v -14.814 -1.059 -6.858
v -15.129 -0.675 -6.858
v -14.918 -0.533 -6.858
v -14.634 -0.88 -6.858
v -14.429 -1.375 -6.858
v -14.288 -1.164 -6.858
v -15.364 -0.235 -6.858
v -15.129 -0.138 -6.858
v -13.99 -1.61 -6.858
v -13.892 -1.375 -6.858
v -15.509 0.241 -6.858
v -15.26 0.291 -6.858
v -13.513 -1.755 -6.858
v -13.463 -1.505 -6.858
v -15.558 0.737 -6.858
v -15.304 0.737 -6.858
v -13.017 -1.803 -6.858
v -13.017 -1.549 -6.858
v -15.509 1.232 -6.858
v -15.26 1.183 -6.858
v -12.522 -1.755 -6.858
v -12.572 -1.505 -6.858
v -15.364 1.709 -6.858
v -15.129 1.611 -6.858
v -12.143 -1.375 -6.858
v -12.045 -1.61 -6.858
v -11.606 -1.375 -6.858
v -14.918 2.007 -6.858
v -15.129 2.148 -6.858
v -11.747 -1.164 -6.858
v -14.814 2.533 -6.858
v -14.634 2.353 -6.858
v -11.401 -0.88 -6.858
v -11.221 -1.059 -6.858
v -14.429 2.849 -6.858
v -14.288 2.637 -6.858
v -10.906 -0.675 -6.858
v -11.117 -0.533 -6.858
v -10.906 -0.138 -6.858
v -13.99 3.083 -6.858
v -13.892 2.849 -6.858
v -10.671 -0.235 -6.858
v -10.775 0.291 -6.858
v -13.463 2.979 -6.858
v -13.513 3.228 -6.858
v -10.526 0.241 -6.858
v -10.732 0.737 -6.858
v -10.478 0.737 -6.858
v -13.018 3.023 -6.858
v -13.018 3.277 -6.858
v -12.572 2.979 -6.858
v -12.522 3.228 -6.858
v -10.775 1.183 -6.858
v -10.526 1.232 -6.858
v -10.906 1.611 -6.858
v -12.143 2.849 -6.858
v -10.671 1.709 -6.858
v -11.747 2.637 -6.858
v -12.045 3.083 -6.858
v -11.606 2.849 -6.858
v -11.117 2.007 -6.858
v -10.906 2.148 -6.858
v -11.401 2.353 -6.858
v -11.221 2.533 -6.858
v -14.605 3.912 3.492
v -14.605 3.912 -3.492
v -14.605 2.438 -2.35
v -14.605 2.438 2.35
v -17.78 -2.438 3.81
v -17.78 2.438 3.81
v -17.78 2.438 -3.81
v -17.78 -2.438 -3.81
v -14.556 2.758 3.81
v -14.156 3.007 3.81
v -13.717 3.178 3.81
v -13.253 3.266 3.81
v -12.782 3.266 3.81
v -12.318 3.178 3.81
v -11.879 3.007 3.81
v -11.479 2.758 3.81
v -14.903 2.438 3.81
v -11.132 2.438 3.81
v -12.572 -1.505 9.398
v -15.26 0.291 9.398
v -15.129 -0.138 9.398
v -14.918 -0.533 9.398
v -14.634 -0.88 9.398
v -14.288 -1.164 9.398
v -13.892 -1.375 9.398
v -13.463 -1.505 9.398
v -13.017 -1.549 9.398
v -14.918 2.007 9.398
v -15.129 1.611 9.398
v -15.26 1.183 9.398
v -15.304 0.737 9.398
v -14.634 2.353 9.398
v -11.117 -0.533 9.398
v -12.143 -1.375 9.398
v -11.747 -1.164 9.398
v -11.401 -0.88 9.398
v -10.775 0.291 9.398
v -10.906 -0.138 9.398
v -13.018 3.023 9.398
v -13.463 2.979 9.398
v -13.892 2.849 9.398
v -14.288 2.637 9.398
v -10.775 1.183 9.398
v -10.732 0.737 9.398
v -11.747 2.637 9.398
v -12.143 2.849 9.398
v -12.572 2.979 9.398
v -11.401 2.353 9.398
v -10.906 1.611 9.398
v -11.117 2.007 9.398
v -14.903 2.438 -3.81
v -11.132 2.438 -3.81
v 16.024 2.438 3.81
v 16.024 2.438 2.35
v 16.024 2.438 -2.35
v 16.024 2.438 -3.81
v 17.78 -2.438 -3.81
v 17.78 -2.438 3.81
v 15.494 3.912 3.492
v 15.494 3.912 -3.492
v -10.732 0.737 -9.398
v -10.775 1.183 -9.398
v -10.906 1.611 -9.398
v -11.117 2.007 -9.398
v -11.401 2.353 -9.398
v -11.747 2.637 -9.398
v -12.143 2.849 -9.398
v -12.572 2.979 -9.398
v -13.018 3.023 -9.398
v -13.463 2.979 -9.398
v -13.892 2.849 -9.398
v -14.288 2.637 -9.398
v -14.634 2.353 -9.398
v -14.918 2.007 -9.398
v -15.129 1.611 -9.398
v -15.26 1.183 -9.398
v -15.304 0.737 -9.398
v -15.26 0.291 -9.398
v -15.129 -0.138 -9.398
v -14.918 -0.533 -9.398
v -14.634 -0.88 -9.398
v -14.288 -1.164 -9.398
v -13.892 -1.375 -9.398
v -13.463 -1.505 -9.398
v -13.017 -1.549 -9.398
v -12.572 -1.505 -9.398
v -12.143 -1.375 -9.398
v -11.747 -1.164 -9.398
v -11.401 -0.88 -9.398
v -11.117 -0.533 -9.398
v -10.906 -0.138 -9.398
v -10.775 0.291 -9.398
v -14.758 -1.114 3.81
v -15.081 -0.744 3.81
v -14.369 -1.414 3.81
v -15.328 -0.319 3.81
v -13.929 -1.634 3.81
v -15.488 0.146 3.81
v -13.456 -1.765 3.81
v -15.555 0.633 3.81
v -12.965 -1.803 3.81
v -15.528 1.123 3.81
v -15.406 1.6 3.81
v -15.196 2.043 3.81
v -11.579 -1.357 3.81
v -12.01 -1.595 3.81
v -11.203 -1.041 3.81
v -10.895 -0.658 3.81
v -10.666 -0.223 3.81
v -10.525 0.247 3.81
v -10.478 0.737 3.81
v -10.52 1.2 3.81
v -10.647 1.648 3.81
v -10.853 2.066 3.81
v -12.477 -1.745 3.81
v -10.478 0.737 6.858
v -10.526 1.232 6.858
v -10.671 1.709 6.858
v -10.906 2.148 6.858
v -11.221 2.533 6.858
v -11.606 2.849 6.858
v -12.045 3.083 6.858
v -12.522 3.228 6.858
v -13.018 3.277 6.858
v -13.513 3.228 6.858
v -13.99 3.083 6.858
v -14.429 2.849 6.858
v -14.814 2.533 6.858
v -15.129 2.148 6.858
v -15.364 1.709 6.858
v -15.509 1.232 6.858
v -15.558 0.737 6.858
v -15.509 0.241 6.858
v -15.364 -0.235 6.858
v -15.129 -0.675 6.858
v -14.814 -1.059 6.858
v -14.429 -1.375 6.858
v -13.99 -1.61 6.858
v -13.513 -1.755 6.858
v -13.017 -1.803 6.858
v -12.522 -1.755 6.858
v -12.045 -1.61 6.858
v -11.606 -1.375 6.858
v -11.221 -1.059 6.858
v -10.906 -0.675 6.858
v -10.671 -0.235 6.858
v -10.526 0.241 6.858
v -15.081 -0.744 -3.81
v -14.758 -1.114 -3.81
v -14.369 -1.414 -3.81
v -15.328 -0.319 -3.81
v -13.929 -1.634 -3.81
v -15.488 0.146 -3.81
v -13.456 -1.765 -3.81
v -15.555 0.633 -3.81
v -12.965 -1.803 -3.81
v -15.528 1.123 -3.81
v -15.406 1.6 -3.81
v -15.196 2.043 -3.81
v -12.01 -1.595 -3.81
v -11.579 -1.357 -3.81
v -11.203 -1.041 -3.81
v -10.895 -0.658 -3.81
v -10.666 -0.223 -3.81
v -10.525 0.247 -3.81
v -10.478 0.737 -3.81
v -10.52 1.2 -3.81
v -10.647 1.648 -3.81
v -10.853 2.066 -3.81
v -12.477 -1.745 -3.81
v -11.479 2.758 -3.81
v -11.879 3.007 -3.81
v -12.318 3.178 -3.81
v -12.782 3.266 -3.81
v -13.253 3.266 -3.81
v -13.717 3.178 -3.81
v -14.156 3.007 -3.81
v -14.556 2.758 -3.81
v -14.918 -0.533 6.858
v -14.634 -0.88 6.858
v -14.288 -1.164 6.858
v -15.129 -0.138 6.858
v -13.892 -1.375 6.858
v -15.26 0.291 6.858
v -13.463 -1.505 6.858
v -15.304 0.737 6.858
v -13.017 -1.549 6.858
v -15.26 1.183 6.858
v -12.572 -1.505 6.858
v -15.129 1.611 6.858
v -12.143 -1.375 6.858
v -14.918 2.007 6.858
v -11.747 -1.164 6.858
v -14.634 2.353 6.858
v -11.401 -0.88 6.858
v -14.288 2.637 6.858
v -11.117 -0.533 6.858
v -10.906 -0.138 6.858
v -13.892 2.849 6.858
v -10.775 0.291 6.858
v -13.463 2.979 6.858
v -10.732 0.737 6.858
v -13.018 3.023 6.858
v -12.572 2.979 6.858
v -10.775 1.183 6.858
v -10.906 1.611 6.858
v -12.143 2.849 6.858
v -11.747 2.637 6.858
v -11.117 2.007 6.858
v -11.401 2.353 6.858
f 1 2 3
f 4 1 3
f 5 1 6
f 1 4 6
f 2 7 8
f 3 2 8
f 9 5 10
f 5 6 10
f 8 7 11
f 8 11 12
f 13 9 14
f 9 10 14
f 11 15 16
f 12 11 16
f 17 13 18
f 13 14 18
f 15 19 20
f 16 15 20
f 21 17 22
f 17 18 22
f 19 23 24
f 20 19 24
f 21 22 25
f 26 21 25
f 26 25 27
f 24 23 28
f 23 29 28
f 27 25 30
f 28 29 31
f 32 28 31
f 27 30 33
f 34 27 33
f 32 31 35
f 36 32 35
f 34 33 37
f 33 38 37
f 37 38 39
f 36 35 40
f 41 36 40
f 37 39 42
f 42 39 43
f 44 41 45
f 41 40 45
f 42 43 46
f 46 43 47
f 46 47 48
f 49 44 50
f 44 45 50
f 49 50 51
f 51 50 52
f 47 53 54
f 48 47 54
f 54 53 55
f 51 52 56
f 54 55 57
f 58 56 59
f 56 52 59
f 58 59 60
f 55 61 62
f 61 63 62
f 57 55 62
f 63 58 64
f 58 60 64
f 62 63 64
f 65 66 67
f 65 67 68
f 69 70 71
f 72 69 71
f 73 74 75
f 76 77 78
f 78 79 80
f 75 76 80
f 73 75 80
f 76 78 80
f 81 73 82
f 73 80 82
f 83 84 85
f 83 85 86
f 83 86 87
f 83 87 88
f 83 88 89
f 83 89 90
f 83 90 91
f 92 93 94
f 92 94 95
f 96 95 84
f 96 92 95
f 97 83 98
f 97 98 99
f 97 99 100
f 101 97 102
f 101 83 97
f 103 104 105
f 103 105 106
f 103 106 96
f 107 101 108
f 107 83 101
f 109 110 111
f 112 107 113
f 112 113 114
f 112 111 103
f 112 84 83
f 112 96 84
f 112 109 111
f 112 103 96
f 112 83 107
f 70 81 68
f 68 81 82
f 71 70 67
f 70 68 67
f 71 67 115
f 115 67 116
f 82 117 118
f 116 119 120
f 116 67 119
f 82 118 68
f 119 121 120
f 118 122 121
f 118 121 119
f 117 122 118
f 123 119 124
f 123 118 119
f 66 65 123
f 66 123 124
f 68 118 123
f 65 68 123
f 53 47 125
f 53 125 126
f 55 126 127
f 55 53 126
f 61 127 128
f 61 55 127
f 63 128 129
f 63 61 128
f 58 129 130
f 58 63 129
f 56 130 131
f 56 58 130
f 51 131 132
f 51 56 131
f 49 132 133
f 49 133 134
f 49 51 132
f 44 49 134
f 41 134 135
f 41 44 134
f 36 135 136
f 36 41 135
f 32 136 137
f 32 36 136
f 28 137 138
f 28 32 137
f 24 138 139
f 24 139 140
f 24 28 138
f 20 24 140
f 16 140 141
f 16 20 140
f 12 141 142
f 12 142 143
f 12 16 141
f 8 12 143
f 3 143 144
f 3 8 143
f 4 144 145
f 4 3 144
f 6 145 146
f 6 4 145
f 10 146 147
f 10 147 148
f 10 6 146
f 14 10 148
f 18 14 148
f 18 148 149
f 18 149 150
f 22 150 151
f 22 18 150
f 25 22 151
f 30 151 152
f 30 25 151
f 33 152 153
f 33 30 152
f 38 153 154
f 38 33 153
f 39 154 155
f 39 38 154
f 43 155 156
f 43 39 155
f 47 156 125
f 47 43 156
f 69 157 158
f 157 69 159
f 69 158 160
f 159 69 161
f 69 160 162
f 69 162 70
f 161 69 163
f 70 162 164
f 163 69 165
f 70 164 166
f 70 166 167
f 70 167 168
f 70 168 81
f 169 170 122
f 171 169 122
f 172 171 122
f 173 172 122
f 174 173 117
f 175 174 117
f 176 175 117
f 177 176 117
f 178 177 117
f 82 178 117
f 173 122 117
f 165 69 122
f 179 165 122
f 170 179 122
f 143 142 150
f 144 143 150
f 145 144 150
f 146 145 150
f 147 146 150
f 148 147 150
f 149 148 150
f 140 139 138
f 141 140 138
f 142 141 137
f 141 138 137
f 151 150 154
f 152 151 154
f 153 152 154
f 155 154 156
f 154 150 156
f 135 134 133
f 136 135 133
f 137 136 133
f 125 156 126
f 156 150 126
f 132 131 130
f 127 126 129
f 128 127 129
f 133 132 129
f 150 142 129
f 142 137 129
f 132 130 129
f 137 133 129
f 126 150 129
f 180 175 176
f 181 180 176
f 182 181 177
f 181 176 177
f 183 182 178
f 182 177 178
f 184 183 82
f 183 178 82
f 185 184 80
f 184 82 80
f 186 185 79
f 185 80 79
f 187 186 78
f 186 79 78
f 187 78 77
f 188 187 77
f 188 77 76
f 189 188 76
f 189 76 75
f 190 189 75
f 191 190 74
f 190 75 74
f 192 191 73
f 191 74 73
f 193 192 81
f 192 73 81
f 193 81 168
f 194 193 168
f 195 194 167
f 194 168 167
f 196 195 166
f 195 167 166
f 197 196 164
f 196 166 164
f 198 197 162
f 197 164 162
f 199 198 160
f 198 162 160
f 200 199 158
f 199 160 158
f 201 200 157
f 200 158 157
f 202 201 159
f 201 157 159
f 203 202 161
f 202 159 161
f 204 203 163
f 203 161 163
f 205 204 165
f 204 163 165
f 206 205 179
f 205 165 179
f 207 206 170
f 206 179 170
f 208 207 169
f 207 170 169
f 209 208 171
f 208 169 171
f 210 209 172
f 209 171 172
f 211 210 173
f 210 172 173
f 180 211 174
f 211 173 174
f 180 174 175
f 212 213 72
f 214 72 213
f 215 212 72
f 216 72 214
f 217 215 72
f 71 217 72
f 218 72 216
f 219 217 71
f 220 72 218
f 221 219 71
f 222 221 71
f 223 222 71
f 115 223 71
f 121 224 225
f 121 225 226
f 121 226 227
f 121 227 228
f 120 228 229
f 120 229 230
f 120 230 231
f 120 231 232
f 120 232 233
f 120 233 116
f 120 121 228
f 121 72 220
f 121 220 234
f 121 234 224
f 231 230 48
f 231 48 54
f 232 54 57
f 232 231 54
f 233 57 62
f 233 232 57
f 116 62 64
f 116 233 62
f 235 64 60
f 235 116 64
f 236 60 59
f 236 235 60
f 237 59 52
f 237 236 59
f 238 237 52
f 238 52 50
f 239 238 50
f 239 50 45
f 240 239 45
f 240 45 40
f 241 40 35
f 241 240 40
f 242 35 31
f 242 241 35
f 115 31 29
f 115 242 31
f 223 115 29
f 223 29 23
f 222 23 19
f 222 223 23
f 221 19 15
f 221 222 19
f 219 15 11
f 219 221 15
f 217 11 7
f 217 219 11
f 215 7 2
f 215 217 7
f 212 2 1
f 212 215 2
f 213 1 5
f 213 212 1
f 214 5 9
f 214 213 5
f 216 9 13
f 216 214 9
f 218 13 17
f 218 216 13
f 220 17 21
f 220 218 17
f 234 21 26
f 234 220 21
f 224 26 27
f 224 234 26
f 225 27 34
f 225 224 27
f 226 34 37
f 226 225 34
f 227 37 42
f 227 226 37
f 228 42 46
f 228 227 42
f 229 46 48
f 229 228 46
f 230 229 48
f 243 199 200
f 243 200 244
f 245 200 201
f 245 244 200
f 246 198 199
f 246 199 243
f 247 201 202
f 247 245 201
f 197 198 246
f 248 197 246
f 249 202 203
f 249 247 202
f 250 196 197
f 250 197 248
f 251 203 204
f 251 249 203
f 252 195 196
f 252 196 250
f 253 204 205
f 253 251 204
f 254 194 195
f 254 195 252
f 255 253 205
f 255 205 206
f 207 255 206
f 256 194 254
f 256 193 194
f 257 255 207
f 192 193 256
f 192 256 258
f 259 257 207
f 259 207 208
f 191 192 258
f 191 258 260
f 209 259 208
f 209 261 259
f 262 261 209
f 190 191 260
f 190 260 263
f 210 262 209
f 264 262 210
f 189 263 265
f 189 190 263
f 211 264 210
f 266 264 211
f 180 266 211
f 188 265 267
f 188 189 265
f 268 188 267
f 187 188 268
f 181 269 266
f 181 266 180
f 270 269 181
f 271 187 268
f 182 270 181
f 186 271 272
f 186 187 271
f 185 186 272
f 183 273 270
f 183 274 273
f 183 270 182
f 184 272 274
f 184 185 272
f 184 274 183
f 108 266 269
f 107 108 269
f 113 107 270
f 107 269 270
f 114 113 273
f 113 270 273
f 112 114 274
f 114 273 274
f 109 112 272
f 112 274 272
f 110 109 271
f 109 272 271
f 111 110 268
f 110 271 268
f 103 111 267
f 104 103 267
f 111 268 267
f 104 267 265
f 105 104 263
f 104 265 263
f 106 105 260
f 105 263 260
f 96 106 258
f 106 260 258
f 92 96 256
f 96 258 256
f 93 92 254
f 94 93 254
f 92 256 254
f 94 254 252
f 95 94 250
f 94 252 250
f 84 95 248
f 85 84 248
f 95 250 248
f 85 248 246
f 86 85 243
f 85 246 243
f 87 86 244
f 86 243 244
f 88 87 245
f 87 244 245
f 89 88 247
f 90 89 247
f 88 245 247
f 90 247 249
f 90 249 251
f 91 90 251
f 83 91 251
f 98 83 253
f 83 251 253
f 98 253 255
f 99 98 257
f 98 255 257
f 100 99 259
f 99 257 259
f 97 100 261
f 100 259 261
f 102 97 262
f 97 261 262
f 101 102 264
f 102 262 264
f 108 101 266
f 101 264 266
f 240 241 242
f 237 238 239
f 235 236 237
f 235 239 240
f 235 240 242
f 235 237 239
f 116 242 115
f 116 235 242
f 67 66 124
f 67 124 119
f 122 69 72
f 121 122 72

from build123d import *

# Parameters (mm, degrees)
SKETCH1_W           = 7.62
SKETCH1_H           = 4.8768
BOSS_EXTRUDE1_DEPTH = 17.78
BOSS_EXTRUDE2_DEPTH = 32.385
CUT_EXTRUDE1_DEPTH  = 8.62
SKETCH5_R           = 2.54
BOSS_EXTRUDE3_DEPTH = 3.048
SKETCH7_R           = 2.286
BOSS_EXTRUDE4_DEPTH = 2.54


with BuildPart() as part:
    # Sketch1 → Boss-Extrude1 (new body, symmetric)
    with BuildSketch(Plane(origin=(0, 0, 0), x_dir=(0, 0, -1), z_dir=(1, 0, 0))):
        Rectangle(SKETCH1_W, SKETCH1_H)
    extrude(amount=BOSS_EXTRUDE1_DEPTH, both=True)

    # Sketch2 → Boss-Extrude2 (add)
    with BuildSketch(Plane(origin=(17.78, 0, 0), x_dir=(0, 0, -1), z_dir=(1, 0, 0))):
        Polygon((-3.4925, 3.9116), (3.4925, 3.9116), (2.3495, 2.4384), (-2.3495, 2.4384), align=None)
    extrude(amount=-BOSS_EXTRUDE2_DEPTH)

    # Sketch3 → Cut-Extrude1 (cut, through all)
    with BuildSketch(Plane.XY.offset(3.81)):
        Polygon((17.78, -2.4384), (15.494, 3.9116), (17.78, 3.9116), align=None)
    extrude(amount=-CUT_EXTRUDE1_DEPTH, mode=Mode.SUBTRACT)

    # Sketch5 → Boss-Extrude3 (add)
    with BuildSketch(Plane.XY.offset(3.81)):
        with Locations((-13.0175, 0.7366)):
            Circle(SKETCH5_R)
    boss_extrude3 = extrude(amount=BOSS_EXTRUDE3_DEPTH)

    # Sketch7 → Boss-Extrude4 (add)
    with BuildSketch(Plane.XY.offset(6.858)):
        with Locations((-13.0175, 0.7366)):
            Circle(SKETCH7_R)
    boss_extrude4 = extrude(amount=BOSS_EXTRUDE4_DEPTH)

    # Mirror1: Boss-Extrude3, Boss-Extrude4 across plane
    add(boss_extrude3.mirror(Plane.XY))
    add(boss_extrude4.mirror(Plane.XY))


solid = part.part
